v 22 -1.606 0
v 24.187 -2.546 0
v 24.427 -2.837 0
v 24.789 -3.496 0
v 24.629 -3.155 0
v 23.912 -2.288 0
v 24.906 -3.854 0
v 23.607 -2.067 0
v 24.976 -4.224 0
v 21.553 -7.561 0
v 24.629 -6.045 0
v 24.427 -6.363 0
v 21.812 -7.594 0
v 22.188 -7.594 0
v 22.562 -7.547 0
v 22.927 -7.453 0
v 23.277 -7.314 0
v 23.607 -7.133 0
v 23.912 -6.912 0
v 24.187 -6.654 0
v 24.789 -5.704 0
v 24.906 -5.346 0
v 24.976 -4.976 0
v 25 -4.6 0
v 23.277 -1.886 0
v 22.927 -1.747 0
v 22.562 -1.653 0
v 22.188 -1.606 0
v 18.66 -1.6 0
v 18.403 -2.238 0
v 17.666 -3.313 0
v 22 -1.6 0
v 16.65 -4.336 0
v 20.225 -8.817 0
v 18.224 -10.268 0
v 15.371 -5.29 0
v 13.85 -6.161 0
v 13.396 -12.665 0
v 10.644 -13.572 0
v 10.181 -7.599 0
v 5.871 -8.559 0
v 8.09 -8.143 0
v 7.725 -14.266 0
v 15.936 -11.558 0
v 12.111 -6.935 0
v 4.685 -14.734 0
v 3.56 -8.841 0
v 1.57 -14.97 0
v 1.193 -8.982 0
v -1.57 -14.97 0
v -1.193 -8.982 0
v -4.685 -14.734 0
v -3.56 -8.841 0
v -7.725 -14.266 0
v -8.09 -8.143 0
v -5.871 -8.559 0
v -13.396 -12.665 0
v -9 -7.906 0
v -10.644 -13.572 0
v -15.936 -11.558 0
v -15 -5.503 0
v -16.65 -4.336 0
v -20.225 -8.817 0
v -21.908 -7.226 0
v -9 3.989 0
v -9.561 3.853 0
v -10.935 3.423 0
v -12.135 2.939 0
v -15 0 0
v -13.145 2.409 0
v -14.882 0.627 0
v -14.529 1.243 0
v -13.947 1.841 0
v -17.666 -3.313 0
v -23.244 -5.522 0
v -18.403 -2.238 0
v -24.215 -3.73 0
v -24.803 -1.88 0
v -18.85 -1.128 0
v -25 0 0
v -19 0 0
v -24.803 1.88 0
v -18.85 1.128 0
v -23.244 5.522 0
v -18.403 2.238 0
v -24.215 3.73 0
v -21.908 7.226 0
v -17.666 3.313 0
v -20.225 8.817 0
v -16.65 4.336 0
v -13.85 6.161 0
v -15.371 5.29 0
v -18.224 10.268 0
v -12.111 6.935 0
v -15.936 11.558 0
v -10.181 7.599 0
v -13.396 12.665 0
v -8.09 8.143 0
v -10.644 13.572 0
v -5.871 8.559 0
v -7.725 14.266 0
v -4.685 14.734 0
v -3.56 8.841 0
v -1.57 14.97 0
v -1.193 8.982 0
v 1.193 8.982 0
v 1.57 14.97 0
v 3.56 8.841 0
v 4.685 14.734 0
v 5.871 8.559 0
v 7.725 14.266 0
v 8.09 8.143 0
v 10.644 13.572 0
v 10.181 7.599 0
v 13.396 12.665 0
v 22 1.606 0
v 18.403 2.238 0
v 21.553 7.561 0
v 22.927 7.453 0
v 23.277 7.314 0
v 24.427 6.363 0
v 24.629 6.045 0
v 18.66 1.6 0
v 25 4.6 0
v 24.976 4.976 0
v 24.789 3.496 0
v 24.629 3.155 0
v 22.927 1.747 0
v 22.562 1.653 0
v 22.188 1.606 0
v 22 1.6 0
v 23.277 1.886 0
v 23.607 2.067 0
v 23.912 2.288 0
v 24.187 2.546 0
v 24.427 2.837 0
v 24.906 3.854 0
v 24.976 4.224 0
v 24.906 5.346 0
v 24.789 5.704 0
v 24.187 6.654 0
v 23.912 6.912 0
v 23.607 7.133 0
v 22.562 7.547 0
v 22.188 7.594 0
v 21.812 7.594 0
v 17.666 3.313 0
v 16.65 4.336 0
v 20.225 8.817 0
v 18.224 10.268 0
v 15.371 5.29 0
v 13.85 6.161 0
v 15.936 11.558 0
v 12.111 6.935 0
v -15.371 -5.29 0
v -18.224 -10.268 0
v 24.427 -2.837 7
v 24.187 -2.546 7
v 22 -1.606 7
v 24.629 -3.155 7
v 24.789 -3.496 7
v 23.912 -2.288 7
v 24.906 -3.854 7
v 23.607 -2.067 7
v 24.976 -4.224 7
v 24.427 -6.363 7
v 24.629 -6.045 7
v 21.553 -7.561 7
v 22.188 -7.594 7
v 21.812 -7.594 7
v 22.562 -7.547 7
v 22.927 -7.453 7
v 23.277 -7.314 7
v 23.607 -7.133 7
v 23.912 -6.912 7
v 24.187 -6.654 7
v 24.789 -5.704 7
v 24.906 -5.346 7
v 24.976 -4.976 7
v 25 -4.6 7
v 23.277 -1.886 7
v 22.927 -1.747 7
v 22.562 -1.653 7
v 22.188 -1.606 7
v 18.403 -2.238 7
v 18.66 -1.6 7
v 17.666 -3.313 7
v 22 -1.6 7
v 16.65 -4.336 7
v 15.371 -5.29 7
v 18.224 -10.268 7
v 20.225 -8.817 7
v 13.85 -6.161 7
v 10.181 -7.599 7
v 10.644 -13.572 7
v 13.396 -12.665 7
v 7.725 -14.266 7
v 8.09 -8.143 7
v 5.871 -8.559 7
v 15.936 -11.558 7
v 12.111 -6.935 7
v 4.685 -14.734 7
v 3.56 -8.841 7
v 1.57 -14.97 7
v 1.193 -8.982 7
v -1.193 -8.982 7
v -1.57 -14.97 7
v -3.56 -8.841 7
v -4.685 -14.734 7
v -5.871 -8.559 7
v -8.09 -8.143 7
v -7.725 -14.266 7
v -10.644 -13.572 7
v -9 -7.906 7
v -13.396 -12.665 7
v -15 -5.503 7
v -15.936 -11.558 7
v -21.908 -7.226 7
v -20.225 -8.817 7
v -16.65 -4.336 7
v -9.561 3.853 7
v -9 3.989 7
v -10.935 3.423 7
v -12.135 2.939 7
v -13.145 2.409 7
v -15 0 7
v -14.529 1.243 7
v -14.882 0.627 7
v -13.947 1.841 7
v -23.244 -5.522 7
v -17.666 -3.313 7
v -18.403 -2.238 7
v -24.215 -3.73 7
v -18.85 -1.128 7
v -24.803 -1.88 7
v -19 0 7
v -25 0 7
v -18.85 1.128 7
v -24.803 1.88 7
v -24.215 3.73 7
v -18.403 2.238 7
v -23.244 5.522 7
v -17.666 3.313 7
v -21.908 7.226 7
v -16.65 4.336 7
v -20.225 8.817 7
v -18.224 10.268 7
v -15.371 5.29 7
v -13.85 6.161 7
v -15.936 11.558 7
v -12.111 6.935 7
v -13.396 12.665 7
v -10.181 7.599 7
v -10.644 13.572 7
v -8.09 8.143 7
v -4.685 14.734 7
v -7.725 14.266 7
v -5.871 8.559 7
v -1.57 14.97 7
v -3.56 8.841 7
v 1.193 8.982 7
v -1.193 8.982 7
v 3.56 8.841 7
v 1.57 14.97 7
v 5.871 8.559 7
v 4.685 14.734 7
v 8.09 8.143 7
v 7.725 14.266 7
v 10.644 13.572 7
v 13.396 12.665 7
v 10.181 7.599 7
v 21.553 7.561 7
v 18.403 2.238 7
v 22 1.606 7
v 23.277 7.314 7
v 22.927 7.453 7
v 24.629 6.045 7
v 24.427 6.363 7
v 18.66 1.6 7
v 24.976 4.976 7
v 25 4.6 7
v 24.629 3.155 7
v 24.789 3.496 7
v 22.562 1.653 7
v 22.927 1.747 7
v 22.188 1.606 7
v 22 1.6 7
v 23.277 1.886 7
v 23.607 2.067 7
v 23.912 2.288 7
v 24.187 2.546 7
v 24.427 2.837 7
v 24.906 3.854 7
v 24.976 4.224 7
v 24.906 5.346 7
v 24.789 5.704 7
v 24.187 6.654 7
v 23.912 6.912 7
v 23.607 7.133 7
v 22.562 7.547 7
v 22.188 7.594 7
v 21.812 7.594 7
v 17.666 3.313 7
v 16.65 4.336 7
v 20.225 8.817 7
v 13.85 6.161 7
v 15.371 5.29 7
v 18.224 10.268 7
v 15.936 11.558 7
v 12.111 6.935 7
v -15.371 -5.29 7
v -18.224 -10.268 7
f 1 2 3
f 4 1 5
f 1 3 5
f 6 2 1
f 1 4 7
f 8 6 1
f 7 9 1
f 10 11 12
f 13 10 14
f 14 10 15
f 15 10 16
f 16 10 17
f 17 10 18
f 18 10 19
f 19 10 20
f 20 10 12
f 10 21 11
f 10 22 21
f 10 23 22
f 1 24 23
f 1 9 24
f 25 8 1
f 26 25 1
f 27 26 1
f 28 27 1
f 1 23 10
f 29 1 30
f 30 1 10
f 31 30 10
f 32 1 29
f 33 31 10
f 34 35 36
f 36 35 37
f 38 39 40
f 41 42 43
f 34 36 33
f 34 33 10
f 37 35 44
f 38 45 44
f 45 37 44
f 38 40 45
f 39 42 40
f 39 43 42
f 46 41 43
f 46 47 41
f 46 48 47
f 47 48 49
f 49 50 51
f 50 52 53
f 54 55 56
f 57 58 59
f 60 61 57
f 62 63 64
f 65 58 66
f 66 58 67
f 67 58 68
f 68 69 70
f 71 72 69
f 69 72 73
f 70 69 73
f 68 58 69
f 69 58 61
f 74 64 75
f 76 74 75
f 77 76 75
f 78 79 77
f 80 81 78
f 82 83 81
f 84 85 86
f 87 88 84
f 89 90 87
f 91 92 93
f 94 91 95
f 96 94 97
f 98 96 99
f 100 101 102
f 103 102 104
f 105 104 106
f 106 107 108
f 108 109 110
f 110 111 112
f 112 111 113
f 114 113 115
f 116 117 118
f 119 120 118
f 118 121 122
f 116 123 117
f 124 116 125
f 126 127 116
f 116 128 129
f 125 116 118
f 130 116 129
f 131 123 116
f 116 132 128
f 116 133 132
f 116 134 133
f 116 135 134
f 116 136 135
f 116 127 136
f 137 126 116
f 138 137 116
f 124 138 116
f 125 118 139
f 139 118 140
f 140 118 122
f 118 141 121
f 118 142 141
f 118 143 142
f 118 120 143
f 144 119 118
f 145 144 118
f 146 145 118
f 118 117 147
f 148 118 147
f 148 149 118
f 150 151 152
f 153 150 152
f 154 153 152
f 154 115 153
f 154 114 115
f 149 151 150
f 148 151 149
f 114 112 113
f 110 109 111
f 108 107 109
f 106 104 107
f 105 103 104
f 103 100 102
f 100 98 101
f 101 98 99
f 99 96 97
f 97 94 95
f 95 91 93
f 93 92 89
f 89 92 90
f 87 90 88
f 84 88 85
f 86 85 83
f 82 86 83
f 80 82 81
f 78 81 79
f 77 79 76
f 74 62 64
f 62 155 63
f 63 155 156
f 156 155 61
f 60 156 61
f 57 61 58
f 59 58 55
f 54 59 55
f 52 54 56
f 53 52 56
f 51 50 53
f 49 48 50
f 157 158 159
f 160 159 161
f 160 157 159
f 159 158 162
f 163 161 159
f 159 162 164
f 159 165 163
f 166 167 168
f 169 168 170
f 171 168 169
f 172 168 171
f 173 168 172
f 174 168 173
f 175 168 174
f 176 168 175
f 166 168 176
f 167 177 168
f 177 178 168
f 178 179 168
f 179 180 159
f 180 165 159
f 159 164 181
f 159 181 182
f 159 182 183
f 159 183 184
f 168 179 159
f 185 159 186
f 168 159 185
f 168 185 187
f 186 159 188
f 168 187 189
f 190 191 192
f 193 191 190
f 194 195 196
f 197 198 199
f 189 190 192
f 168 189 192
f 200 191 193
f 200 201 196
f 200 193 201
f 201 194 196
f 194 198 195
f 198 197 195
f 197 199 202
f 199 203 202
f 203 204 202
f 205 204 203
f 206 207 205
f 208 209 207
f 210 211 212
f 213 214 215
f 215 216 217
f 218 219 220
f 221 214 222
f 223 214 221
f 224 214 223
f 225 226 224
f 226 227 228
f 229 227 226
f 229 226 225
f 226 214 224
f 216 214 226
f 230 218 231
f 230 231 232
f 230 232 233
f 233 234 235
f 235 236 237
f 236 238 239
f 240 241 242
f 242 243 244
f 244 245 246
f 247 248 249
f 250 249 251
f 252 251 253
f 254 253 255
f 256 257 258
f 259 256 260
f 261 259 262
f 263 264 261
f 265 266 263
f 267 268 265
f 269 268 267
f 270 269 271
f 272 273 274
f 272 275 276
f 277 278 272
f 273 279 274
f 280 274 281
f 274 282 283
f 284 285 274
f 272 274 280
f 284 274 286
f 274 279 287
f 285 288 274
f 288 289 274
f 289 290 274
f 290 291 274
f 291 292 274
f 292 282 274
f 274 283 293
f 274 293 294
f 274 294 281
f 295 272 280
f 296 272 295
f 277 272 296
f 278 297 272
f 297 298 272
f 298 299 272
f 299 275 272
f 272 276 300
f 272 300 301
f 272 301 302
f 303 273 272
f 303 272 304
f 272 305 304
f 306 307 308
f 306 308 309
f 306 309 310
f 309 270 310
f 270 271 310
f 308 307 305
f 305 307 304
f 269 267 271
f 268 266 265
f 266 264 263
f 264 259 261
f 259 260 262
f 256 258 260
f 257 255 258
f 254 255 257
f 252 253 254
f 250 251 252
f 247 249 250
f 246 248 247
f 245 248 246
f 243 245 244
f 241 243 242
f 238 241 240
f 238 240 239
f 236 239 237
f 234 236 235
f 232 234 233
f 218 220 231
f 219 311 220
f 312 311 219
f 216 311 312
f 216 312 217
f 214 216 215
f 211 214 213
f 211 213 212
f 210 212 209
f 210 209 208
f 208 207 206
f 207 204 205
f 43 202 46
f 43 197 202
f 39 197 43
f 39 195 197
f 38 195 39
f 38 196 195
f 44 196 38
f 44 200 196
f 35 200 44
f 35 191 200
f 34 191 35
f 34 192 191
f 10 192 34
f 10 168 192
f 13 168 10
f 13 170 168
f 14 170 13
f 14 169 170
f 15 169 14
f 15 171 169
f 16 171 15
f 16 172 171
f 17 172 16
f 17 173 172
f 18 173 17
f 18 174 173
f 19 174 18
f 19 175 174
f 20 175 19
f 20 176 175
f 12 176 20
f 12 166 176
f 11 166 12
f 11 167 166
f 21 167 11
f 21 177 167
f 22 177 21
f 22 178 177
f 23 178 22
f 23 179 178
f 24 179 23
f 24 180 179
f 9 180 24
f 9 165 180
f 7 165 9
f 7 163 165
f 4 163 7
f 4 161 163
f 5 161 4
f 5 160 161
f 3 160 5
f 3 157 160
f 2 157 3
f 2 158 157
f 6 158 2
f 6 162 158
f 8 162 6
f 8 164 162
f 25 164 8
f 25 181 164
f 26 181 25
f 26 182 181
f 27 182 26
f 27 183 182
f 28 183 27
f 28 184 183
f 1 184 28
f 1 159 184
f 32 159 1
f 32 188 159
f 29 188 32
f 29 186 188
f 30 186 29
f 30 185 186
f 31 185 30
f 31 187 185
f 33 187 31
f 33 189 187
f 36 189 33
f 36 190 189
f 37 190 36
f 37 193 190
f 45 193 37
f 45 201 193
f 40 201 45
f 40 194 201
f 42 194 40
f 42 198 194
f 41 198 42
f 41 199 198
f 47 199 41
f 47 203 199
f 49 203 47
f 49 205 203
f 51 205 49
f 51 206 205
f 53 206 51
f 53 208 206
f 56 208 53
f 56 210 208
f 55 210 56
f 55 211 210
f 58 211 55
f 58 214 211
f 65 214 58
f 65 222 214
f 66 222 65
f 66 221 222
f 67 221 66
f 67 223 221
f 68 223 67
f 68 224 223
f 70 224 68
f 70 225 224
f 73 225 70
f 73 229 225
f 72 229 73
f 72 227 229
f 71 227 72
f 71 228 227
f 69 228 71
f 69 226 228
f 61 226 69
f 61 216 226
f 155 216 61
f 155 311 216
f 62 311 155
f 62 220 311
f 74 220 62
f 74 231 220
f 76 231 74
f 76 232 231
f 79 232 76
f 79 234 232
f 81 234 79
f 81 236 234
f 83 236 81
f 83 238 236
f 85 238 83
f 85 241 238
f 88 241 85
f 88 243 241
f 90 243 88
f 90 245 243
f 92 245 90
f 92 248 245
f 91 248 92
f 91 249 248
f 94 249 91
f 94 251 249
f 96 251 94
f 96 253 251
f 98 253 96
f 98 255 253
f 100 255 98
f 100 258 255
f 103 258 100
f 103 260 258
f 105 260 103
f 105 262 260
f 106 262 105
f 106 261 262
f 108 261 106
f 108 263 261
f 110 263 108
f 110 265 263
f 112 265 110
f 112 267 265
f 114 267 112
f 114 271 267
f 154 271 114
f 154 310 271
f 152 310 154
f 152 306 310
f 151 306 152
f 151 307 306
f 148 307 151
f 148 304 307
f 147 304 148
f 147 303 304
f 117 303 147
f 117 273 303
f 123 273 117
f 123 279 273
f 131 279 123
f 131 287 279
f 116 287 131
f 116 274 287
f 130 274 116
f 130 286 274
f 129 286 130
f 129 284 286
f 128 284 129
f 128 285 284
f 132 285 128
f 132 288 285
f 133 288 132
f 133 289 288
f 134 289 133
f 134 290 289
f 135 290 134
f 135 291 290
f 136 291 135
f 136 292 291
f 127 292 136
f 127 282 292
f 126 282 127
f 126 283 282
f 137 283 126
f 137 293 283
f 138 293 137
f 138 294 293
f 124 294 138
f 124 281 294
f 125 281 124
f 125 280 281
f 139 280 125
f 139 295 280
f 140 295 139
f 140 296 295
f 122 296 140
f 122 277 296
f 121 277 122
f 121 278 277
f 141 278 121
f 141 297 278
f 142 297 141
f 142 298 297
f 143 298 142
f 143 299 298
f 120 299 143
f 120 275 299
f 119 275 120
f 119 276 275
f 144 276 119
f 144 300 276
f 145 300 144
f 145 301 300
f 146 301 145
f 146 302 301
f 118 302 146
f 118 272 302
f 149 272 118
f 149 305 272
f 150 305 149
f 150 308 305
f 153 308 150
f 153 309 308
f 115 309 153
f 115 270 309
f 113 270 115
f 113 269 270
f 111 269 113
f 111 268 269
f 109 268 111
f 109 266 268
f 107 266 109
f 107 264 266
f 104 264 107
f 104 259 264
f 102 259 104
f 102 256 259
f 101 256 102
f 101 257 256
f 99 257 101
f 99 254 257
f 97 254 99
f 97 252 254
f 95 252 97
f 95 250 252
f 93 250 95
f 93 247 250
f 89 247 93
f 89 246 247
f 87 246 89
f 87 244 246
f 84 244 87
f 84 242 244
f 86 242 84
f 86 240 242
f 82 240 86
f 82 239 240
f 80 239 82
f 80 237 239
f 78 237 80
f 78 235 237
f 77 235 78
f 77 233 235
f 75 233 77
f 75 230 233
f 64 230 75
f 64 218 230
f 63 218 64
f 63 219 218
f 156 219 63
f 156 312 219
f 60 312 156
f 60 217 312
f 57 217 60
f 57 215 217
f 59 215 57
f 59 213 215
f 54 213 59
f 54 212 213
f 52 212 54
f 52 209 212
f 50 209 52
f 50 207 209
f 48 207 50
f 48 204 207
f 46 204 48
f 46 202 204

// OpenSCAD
/*

*/

//-------------configure
//degree of detail
$fn=50;

//scale in x (not height)
sizex = 50;

//scale in y (not height)
sizey = 30;

//scale in z (height)
sizez = 7;

//wall thickness
wall = 6;

//thickness of the actual cable
cablesize = 4;

//getting a cable in is supposed to be a tight fit
//ajust here how tight (compared to cable thickness)
entranceScale = 0.8;

//0 to turn off entrance improvements
//1 to turn on entrance improvements
entranceImprovement=1;

//-------------configure end
eimp = true;


entrance = cablesize*entranceScale;

//this code creates the opening for the back side
//of the clip
module channel(){
	difference(){
		scale([sizex - wall * 2,sizey - wall * 2]) 
			circle(r=0.5);	
		scale([sizex - wall * 2-cablesize *2,sizey - wall * 2-cablesize *2]) 
			circle(r=0.5);	
		translate([0,-sizey/2])
			square([sizex/2,sizey]);
		translate([-(sizex/2 - cablesize -wall),-sizey/2])
		square([sizex/2 - cablesize -wall,sizey/2]);
	
	}
}

//this is what gets cit out of the elipse to create
//a clip.
module stencil() {
	difference()
	{
		scale([sizex - wall * 2,sizey - wall * 2]) 
			circle(r=0.5);
		
		difference(){
			translate([-(sizex/2-wall),-sizey/2])
				square([cablesize+wall,sizey]);
	
			channel();
		}

	}

//i was experimenting with a circular ending of the
//channel.  Turned out do be a structual weakness feel
//free to experiment ;-)

/*
	translate([-(sizex/2 - wall-cablesize ),-cablesize/2])
	scale([cablesize,cablesize ])
	#circle(r=0.5);
*/
}

module improvedEntrance()
{
translate([sizex/2 -wall/2,-wall/2 -entrance/2])
difference(){
translate([0,0])
	square([wall/2, wall/2 + entrance/4]);
scale([wall,wall])
			circle(r=0.5);
}


translate([sizex/2 -wall/2,wall/2 +entrance/2])
difference(){
translate([0,-(wall/2 + entrance/4)])
	square([wall/2,wall/2 + entrance/4]);
scale([wall,wall])
			circle(r=0.5);
}

}

//cutting out the stencil from the elipse makes the clip
module main(){
	difference()
	{
		scale([sizex,sizey])
			circle(r=0.5);
		stencil();
translate([sizex/2 -wall * 1.5,-entrance/2]) 
			square([wall * 2,entrance]);
	
	}
}

module CableClip(){
difference()
{
	main();
	if(entranceImprovement != 0)
	{
		improvedEntrance();
	}
}

	if(entranceImprovement != 0)
	{
		translate([sizex/2 -wall/2,-wall/2 -entrance/2])
		scale([wall,wall])
				circle(r=0.5);
	
		translate([sizex/2 -wall/2,wall/2 +entrance/2])
		scale([wall,wall])
				circle(r=0.5);
	}
}


//making the 2d drawing 3d
//commend out for 2d dawing
linear_extrude(height=sizez)
	CableClip();
